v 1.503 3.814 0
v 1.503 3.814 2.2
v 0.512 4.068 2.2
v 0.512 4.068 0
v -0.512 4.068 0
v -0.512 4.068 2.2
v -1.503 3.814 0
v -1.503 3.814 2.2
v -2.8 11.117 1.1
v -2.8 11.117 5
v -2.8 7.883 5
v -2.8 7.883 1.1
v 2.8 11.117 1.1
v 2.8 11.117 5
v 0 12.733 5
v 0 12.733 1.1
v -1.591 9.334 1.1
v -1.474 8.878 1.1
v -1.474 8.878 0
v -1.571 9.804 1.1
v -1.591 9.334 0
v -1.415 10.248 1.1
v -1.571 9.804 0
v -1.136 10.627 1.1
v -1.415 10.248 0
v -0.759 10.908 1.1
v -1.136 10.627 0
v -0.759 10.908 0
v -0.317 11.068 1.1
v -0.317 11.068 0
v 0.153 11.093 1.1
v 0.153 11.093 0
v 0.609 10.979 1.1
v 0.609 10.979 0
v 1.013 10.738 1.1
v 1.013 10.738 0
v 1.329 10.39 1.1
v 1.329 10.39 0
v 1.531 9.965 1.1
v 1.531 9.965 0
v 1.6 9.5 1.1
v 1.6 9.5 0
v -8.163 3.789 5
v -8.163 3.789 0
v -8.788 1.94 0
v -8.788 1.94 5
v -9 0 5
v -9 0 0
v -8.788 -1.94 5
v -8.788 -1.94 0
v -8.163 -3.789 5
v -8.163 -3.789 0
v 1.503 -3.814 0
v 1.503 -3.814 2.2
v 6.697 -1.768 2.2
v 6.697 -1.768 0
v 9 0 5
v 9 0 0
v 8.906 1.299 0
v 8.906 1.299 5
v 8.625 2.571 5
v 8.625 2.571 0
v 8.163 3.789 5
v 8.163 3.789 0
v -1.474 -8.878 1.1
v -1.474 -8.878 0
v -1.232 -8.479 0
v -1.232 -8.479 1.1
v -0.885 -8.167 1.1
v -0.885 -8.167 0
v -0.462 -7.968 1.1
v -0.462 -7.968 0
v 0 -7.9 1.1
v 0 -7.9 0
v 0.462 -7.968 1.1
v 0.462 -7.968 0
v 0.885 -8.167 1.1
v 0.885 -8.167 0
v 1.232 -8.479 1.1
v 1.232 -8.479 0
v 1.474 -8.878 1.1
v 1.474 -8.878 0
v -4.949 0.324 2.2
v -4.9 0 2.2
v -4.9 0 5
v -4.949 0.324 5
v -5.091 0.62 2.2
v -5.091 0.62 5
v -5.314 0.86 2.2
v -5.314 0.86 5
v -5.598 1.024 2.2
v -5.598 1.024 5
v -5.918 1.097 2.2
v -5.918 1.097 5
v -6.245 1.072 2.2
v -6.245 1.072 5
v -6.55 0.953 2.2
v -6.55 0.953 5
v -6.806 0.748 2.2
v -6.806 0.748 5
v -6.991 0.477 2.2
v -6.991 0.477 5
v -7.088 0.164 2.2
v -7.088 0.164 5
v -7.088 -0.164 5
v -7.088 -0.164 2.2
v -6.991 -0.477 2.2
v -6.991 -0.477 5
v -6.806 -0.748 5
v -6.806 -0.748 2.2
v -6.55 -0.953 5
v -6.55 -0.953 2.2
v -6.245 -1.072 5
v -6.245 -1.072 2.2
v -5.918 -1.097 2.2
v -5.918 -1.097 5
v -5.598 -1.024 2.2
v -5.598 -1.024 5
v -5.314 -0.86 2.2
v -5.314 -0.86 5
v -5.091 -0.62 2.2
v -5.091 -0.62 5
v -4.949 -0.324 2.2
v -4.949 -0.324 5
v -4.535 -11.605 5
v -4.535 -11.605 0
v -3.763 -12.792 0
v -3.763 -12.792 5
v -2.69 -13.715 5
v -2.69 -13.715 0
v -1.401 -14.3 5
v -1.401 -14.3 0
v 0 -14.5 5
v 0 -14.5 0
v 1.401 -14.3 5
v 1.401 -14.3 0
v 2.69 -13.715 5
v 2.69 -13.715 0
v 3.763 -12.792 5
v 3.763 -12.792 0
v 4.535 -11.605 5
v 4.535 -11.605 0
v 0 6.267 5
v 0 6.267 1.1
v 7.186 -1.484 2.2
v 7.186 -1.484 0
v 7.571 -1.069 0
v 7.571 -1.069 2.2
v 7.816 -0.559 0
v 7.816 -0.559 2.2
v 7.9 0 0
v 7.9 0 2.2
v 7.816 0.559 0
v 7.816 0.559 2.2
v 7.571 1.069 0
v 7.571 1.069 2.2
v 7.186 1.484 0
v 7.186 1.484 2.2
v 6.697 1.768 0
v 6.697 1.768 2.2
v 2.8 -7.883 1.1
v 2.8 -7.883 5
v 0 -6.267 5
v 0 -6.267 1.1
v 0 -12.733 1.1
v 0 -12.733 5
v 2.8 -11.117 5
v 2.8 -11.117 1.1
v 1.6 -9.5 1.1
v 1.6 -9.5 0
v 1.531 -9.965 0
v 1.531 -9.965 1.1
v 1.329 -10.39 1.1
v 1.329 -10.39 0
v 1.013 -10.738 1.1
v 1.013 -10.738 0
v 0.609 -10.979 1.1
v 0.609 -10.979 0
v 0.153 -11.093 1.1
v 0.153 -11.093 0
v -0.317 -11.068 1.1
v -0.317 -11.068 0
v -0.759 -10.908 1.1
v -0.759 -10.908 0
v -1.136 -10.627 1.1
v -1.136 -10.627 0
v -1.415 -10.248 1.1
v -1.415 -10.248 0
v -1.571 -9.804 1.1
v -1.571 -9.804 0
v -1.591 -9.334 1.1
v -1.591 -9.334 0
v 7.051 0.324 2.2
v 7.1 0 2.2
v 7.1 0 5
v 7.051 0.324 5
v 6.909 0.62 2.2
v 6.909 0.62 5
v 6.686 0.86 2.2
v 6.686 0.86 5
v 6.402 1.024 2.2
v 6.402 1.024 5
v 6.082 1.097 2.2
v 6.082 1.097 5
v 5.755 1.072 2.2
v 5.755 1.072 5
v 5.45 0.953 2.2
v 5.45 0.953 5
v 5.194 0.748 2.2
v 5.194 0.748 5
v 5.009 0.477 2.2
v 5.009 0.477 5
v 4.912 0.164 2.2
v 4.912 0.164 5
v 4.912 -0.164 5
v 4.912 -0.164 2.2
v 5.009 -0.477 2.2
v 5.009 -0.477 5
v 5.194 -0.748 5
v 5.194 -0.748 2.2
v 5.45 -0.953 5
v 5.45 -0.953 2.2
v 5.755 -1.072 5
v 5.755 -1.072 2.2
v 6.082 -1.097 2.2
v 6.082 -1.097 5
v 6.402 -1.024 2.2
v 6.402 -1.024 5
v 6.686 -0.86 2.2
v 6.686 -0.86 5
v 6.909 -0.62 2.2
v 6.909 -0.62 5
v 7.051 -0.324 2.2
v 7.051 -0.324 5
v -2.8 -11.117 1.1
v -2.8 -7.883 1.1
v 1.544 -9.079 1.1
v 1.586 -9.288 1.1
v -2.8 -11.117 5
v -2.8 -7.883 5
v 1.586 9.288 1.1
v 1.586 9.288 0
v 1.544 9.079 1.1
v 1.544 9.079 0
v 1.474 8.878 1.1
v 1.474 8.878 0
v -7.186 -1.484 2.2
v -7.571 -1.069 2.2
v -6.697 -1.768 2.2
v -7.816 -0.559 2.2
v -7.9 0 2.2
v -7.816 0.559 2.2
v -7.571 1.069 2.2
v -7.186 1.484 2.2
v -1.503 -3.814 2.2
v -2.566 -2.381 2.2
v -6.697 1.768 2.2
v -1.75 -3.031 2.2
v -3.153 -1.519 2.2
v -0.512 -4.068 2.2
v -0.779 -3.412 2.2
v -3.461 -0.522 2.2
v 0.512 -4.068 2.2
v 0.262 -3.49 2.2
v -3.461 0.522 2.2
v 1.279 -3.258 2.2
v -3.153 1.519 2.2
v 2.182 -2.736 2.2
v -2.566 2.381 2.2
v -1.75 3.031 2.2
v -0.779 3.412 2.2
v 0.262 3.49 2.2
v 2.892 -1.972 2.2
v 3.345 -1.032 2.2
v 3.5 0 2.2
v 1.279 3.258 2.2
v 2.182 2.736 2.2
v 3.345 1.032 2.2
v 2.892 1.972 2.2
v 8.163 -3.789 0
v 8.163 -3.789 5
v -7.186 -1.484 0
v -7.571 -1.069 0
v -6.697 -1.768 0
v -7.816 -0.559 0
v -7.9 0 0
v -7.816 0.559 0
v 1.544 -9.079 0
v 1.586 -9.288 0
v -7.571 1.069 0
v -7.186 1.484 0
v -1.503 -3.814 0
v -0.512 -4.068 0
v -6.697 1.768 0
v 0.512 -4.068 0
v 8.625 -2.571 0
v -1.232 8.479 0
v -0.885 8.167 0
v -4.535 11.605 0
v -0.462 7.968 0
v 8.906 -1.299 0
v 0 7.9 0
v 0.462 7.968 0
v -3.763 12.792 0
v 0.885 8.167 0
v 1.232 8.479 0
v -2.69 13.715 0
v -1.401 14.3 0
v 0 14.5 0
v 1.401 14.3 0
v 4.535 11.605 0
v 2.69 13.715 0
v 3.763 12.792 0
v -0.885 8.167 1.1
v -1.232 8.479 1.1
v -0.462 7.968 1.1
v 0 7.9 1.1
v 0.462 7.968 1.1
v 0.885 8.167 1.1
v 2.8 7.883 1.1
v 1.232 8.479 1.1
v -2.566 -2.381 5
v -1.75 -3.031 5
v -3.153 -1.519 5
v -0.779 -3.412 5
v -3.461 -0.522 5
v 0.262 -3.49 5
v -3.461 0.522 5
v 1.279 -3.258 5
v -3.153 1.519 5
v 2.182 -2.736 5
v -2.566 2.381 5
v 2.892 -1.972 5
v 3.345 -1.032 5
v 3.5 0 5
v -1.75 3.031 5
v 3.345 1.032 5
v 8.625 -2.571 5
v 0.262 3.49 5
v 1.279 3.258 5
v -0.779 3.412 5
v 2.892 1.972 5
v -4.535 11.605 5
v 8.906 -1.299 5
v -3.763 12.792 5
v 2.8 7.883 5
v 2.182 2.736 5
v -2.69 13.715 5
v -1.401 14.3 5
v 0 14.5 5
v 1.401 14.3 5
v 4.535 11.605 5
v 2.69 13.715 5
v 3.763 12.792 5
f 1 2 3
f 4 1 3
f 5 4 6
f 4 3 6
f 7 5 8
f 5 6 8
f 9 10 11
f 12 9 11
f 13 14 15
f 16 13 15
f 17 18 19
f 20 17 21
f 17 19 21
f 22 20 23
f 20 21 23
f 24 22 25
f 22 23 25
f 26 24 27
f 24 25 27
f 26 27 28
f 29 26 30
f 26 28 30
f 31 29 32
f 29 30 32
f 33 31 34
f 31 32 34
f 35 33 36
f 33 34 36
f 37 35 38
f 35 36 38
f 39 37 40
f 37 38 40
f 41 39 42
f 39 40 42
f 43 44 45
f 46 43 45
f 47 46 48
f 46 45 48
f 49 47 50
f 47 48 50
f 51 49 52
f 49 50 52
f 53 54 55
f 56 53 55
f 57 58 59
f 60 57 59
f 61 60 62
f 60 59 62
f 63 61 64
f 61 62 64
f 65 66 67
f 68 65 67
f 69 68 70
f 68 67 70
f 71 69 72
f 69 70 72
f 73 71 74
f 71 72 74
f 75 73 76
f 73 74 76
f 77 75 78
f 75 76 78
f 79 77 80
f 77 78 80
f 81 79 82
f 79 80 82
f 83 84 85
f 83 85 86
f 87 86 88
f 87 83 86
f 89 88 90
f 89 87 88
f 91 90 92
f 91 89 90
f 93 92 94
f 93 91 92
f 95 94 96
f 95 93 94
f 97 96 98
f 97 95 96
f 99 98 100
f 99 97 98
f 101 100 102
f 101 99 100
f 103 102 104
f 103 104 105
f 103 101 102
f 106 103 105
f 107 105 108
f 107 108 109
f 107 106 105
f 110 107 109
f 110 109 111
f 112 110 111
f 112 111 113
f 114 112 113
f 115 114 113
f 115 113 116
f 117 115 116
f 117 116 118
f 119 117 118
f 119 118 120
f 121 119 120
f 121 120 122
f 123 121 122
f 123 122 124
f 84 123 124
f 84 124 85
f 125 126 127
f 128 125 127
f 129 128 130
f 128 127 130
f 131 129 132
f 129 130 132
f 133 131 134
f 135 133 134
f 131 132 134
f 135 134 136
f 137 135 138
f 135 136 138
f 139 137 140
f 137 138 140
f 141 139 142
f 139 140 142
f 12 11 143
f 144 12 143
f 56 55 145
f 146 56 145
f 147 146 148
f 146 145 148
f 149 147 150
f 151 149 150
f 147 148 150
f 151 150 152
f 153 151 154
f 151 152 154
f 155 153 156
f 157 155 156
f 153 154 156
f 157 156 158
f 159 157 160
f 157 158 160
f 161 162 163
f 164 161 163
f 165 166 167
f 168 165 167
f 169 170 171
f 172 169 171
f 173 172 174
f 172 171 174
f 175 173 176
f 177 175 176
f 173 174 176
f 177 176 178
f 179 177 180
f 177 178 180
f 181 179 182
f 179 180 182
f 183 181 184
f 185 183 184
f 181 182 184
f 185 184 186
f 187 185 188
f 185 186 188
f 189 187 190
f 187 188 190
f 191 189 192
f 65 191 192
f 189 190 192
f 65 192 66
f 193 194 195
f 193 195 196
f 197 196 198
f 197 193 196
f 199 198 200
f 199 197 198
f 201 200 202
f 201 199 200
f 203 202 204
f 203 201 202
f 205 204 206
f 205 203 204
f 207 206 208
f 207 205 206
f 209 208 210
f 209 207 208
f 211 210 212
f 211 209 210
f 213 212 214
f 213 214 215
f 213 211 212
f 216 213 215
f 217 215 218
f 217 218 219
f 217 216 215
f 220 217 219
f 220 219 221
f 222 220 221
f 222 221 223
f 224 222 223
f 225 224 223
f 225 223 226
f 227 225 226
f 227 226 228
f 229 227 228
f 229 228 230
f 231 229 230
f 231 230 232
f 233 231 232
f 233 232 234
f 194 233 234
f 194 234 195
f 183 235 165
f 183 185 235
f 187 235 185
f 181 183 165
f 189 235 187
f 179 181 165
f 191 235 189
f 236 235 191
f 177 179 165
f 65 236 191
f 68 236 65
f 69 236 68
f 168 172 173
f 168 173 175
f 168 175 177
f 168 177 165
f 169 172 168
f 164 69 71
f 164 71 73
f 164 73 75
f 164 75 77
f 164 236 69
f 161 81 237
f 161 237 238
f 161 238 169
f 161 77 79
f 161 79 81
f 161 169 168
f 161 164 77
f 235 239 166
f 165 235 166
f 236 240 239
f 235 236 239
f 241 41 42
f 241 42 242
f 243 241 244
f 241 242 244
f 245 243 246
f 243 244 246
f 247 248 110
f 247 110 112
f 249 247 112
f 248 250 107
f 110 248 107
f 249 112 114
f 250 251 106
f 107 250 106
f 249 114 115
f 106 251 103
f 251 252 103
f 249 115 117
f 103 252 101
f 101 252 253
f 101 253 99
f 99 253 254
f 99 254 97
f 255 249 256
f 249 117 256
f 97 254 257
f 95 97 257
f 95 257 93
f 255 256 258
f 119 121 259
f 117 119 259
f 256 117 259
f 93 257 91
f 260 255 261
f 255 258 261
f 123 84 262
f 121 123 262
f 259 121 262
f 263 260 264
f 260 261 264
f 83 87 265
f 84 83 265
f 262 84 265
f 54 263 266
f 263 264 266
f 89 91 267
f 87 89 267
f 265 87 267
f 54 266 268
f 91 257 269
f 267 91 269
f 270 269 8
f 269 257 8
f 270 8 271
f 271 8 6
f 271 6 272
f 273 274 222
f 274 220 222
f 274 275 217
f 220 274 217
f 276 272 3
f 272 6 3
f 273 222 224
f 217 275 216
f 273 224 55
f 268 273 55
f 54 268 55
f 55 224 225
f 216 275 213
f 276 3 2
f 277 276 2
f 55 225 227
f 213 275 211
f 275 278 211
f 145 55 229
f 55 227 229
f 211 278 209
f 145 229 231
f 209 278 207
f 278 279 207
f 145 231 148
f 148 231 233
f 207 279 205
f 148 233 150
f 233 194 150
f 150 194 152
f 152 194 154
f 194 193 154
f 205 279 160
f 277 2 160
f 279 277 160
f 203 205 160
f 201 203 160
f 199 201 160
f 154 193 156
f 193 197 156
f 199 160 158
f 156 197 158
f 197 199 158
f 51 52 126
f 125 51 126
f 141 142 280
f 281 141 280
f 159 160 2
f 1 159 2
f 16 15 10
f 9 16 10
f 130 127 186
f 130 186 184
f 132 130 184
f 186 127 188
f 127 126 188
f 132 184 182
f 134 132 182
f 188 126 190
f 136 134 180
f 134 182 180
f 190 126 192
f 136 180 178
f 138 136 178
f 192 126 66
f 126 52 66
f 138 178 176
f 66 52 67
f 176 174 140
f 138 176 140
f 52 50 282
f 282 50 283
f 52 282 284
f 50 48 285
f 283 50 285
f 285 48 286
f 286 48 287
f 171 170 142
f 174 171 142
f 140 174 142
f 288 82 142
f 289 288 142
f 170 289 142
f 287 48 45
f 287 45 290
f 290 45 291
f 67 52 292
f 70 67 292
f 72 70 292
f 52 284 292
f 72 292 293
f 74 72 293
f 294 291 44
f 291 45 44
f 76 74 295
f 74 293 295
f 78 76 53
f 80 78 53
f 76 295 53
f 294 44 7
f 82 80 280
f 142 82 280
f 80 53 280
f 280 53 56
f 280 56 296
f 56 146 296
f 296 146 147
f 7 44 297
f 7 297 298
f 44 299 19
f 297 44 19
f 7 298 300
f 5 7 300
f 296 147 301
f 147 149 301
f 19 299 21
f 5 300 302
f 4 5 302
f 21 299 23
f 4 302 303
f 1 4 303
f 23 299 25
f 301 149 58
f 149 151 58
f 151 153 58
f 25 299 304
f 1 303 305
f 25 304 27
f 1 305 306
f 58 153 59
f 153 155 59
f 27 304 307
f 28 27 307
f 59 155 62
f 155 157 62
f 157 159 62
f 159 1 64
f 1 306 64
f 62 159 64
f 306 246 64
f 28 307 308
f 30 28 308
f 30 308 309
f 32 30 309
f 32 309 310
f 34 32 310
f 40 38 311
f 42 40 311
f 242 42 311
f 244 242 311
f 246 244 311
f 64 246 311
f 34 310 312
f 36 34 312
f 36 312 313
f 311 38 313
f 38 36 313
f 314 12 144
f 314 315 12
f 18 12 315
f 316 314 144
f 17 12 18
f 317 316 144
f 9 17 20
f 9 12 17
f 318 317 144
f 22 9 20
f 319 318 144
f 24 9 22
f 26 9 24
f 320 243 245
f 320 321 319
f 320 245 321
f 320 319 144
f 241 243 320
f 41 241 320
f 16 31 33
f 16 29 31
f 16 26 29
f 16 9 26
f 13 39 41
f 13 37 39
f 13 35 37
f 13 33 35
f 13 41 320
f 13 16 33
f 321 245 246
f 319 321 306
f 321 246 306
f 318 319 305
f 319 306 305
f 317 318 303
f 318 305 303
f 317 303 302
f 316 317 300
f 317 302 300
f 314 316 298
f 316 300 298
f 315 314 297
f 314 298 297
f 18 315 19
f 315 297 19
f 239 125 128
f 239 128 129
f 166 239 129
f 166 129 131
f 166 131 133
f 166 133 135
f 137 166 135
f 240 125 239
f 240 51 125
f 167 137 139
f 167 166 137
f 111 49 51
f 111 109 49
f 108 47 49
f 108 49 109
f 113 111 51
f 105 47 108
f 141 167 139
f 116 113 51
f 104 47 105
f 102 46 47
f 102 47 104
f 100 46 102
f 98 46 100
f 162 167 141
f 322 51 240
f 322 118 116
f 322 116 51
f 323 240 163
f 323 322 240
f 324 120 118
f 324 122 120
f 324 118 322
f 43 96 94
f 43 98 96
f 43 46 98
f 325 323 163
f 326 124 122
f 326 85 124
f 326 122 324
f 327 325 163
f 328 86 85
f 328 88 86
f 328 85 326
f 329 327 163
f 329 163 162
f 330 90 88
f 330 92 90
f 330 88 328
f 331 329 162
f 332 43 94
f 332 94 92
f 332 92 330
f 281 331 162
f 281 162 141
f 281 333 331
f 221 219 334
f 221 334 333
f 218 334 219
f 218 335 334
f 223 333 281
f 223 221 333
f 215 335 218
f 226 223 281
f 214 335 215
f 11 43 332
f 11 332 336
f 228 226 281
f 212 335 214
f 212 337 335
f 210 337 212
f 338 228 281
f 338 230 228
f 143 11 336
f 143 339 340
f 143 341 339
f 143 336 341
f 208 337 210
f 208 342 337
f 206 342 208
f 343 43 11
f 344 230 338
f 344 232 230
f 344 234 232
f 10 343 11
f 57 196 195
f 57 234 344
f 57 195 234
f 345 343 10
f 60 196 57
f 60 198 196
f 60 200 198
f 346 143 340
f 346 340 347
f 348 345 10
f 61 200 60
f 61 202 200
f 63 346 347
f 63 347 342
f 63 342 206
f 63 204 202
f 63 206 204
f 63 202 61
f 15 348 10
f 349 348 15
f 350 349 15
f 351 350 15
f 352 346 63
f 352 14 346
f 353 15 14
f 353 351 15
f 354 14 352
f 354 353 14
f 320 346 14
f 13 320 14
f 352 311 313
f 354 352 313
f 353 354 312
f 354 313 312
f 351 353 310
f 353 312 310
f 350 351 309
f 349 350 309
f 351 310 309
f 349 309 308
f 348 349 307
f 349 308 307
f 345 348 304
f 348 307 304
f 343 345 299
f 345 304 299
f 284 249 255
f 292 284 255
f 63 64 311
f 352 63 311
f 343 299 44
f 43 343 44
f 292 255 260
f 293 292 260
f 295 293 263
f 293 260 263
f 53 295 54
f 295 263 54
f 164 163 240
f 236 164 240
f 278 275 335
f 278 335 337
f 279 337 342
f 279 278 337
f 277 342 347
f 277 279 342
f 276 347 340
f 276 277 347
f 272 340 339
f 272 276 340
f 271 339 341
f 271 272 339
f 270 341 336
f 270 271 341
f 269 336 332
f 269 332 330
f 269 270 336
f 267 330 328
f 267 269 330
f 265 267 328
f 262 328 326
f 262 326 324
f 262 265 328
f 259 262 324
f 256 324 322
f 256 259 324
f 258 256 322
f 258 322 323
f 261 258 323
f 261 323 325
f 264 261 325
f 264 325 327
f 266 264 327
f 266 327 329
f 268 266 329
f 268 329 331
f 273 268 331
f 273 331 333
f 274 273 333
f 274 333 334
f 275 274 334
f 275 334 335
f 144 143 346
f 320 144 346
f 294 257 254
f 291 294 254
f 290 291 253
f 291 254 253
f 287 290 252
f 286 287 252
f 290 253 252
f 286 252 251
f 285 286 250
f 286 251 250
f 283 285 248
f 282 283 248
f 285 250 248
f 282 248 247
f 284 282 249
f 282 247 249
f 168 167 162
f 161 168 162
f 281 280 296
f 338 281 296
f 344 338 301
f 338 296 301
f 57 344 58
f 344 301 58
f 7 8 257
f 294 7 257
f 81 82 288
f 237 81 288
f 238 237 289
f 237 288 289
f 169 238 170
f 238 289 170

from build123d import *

# Parameters (mm, degrees)
F0_R     = 1.1
F0_R_2   = 3.5
F1_DEPTH = 5
F2_R     = 1.6
F3_DEPTH = 3.9
F5_START = -2.8
F5_DEPTH = 22.2


with BuildPart() as f1:
    # F0 (on Top) → F1 (new body)
    with BuildSketch(Plane.XY):
        with BuildLine():
            ThreePointArc((-1.4743268336, 8.8784210526), (-0.3170781184, 11.0682670266), (1.6, 9.5))
            ThreePointArc((1.6, 9.5), (1.5682670266, 9.1829218816), (1.4743268336, 8.8784210526))
            ThreePointArc((1.4743268336, 8.8784210526), (3.1253325319, 8.4399227819), (4.6637452107, 7.6973684211))
            ThreePointArc((4.6637452107, 7.6973684211), (4.9152174954, 8.5831374295), (5, 9.5))
            ThreePointArc((5, 9.5), (4.882412579, 10.5779830278), (4.5351810367, 11.6052631579))
            ThreePointArc((4.5351810367, 11.6052631579), (0, 14.5), (-4.5351810367, 11.6052631579))
            ThreePointArc((-4.5351810367, 11.6052631579), (-4.9972964036, 9.6644039381), (-4.6637452107, 7.6973684211))
            ThreePointArc((-4.6637452107, 7.6973684211), (-3.1253325319, 8.4399227819), (-1.4743268336, 8.8784210526))
        make_face()
        with BuildLine():
            ThreePointArc((1.4743268336, 8.8784210526), (0, 7.9), (-1.4743268336, 8.8784210526))
            ThreePointArc((-1.4743268336, 8.8784210526), (-3.1253325319, 8.4399227819), (-4.6637452107, 7.6973684211))
            ThreePointArc((-4.6637452107, 7.6973684211), (0, 4.5), (4.6637452107, 7.6973684211))
            ThreePointArc((4.6637452107, 7.6973684211), (3.1253325319, 8.4399227819), (1.4743268336, 8.8784210526))
        make_face()
        with BuildLine():
            ThreePointArc((4.6637452107, 7.6973684211), (0, 4.5), (-4.6637452107, 7.6973684211))
            ThreePointArc((-4.6637452107, 7.6973684211), (-6.7045766773, 6.0040529294), (-8.1633258661, 3.7894736842))
            ThreePointArc((-8.1633258661, 3.7894736842), (-9, 0), (-8.1633258661, -3.7894736842))
            ThreePointArc((-8.1633258661, -3.7894736842), (-6.7045766773, -6.0040529294), (-4.6637452107, -7.6973684211))
            ThreePointArc((-4.6637452107, -7.6973684211), (0, -4.5), (4.6637452107, -7.6973684211))
            ThreePointArc((4.6637452107, -7.6973684211), (6.7045766773, -6.0040529294), (8.1633258661, -3.7894736842))
            ThreePointArc((8.1633258661, -3.7894736842), (8.7883426423, -1.94036945), (9, 0))
            ThreePointArc((9, 0), (8.7883426423, 1.94036945), (8.1633258661, 3.7894736842))
            ThreePointArc((8.1633258661, 3.7894736842), (6.7045766773, 6.0040529294), (4.6637452107, 7.6973684211))
        make_face()
        with Locations((-6, 0)):
            Circle(F0_R, mode=Mode.SUBTRACT)
        Circle(F0_R_2, mode=Mode.SUBTRACT)
        with Locations((6, 0)):
            Circle(F0_R, mode=Mode.SUBTRACT)
        with BuildLine():
            ThreePointArc((-8.1633258661, 3.7894736842), (-6.7045766773, 6.0040529294), (-4.6637452107, 7.6973684211))
            ThreePointArc((-4.6637452107, 7.6973684211), (-4.9972964036, 9.6644039381), (-4.5351810367, 11.6052631579))
            Line((-4.5351810367, 11.6052631579), (-8.1633258661, 3.7894736842))
        make_face()
        with BuildLine():
            ThreePointArc((5, 9.5), (4.9152174954, 8.5831374295), (4.6637452107, 7.6973684211))
            ThreePointArc((4.6637452107, 7.6973684211), (6.7045766773, 6.0040529294), (8.1633258661, 3.7894736842))
            Line((8.1633258661, 3.7894736842), (4.5351810367, 11.6052631579))
            ThreePointArc((4.5351810367, 11.6052631579), (4.882412579, 10.5779830278), (5, 9.5))
        make_face()
        with BuildLine():
            ThreePointArc((-4.6637452107, -7.6973684211), (-6.7045766773, -6.0040529294), (-8.1633258661, -3.7894736842))
            Line((-8.1633258661, -3.7894736842), (-4.5351810367, -11.6052631579))
            ThreePointArc((-4.5351810367, -11.6052631579), (-4.9972964036, -9.6644039381), (-4.6637452107, -7.6973684211))
        make_face()
        with BuildLine():
            ThreePointArc((-1.4743268336, -8.8784210526), (-3.1253325319, -8.4399227819), (-4.6637452107, -7.6973684211))
            ThreePointArc((-4.6637452107, -7.6973684211), (-4.9972964036, -9.6644039381), (-4.5351810367, -11.6052631579))
            ThreePointArc((-4.5351810367, -11.6052631579), (0, -14.5), (4.5351810367, -11.6052631579))
            ThreePointArc((4.5351810367, -11.6052631579), (4.882412579, -10.5779830278), (5, -9.5))
            ThreePointArc((5, -9.5), (4.9152174954, -8.5831374295), (4.6637452107, -7.6973684211))
            ThreePointArc((4.6637452107, -7.6973684211), (3.1253325319, -8.4399227819), (1.4743268336, -8.8784210526))
            ThreePointArc((1.4743268336, -8.8784210526), (1.5682670266, -9.1829218816), (1.6, -9.5))
            ThreePointArc((1.6, -9.5), (-0.3170781184, -11.0682670266), (-1.4743268336, -8.8784210526))
        make_face()
        with BuildLine():
            ThreePointArc((4.6637452107, -7.6973684211), (0, -4.5), (-4.6637452107, -7.6973684211))
            ThreePointArc((-4.6637452107, -7.6973684211), (-3.1253325319, -8.4399227819), (-1.4743268336, -8.8784210526))
            ThreePointArc((-1.4743268336, -8.8784210526), (0, -7.9), (1.4743268336, -8.8784210526))
            ThreePointArc((1.4743268336, -8.8784210526), (3.1253325319, -8.4399227819), (4.6637452107, -7.6973684211))
        make_face()
        with BuildLine():
            Line((4.5351810367, -11.6052631579), (8.1633258661, -3.7894736842))
            ThreePointArc((8.1633258661, -3.7894736842), (6.7045766773, -6.0040529294), (4.6637452107, -7.6973684211))
            ThreePointArc((4.6637452107, -7.6973684211), (4.9152174954, -8.5831374295), (5, -9.5))
            ThreePointArc((5, -9.5), (4.882412579, -10.5779830278), (4.5351810367, -11.6052631579))
        make_face()
    extrude(amount=F1_DEPTH)

    # F2 (on face) → F3 (cut)
    with BuildSketch(Plane.XY.offset(5)):
        Polygon((2.8, 7.8834192463), (2.8, 11.1165807537), (0, 12.7331615075), (-2.8, 11.1165807537), (-2.8, 7.8834192463), (0, 6.2668384925), align=None)
        with Locations((0, 9.5)):
            Circle(F2_R, mode=Mode.SUBTRACT)
        Polygon((-2.8, -11.1165807537), (0, -12.7331615075), (2.8, -11.1165807537), (2.8, -7.8834192463), (0, -6.2668384925), (-2.8, -7.8834192463), align=None)
    extrude(amount=-F3_DEPTH, mode=Mode.SUBTRACT)

    # F4 (on face) → F5 (cut)
    with BuildSketch(Plane.XY.offset(5).offset(F5_START)):
        with BuildLine():
            Line((-1.5033333333, 3.8144447681), (-6.6966666667, 1.7676695267))
            ThreePointArc((-6.6966666667, 1.7676695267), (-7.9, 0), (-6.6966666667, -1.7676695267))
            Line((-6.6966666667, -1.7676695267), (-1.5033333333, -3.8144447681))
            ThreePointArc((-1.5033333333, -3.8144447681), (0, -4.1), (1.5033333333, -3.8144447681))
            Line((1.5033333333, -3.8144447681), (6.6966666667, -1.7676695267))
            ThreePointArc((6.6966666667, -1.7676695267), (7.9, 0), (6.6966666667, 1.7676695267))
            Line((6.6966666667, 1.7676695267), (1.5033333333, 3.8144447681))
            ThreePointArc((1.5033333333, 3.8144447681), (0, 4.1), (-1.5033333333, 3.8144447681))
        make_face()
    extrude(amount=-F5_DEPTH, mode=Mode.SUBTRACT)


solid = f1.part
